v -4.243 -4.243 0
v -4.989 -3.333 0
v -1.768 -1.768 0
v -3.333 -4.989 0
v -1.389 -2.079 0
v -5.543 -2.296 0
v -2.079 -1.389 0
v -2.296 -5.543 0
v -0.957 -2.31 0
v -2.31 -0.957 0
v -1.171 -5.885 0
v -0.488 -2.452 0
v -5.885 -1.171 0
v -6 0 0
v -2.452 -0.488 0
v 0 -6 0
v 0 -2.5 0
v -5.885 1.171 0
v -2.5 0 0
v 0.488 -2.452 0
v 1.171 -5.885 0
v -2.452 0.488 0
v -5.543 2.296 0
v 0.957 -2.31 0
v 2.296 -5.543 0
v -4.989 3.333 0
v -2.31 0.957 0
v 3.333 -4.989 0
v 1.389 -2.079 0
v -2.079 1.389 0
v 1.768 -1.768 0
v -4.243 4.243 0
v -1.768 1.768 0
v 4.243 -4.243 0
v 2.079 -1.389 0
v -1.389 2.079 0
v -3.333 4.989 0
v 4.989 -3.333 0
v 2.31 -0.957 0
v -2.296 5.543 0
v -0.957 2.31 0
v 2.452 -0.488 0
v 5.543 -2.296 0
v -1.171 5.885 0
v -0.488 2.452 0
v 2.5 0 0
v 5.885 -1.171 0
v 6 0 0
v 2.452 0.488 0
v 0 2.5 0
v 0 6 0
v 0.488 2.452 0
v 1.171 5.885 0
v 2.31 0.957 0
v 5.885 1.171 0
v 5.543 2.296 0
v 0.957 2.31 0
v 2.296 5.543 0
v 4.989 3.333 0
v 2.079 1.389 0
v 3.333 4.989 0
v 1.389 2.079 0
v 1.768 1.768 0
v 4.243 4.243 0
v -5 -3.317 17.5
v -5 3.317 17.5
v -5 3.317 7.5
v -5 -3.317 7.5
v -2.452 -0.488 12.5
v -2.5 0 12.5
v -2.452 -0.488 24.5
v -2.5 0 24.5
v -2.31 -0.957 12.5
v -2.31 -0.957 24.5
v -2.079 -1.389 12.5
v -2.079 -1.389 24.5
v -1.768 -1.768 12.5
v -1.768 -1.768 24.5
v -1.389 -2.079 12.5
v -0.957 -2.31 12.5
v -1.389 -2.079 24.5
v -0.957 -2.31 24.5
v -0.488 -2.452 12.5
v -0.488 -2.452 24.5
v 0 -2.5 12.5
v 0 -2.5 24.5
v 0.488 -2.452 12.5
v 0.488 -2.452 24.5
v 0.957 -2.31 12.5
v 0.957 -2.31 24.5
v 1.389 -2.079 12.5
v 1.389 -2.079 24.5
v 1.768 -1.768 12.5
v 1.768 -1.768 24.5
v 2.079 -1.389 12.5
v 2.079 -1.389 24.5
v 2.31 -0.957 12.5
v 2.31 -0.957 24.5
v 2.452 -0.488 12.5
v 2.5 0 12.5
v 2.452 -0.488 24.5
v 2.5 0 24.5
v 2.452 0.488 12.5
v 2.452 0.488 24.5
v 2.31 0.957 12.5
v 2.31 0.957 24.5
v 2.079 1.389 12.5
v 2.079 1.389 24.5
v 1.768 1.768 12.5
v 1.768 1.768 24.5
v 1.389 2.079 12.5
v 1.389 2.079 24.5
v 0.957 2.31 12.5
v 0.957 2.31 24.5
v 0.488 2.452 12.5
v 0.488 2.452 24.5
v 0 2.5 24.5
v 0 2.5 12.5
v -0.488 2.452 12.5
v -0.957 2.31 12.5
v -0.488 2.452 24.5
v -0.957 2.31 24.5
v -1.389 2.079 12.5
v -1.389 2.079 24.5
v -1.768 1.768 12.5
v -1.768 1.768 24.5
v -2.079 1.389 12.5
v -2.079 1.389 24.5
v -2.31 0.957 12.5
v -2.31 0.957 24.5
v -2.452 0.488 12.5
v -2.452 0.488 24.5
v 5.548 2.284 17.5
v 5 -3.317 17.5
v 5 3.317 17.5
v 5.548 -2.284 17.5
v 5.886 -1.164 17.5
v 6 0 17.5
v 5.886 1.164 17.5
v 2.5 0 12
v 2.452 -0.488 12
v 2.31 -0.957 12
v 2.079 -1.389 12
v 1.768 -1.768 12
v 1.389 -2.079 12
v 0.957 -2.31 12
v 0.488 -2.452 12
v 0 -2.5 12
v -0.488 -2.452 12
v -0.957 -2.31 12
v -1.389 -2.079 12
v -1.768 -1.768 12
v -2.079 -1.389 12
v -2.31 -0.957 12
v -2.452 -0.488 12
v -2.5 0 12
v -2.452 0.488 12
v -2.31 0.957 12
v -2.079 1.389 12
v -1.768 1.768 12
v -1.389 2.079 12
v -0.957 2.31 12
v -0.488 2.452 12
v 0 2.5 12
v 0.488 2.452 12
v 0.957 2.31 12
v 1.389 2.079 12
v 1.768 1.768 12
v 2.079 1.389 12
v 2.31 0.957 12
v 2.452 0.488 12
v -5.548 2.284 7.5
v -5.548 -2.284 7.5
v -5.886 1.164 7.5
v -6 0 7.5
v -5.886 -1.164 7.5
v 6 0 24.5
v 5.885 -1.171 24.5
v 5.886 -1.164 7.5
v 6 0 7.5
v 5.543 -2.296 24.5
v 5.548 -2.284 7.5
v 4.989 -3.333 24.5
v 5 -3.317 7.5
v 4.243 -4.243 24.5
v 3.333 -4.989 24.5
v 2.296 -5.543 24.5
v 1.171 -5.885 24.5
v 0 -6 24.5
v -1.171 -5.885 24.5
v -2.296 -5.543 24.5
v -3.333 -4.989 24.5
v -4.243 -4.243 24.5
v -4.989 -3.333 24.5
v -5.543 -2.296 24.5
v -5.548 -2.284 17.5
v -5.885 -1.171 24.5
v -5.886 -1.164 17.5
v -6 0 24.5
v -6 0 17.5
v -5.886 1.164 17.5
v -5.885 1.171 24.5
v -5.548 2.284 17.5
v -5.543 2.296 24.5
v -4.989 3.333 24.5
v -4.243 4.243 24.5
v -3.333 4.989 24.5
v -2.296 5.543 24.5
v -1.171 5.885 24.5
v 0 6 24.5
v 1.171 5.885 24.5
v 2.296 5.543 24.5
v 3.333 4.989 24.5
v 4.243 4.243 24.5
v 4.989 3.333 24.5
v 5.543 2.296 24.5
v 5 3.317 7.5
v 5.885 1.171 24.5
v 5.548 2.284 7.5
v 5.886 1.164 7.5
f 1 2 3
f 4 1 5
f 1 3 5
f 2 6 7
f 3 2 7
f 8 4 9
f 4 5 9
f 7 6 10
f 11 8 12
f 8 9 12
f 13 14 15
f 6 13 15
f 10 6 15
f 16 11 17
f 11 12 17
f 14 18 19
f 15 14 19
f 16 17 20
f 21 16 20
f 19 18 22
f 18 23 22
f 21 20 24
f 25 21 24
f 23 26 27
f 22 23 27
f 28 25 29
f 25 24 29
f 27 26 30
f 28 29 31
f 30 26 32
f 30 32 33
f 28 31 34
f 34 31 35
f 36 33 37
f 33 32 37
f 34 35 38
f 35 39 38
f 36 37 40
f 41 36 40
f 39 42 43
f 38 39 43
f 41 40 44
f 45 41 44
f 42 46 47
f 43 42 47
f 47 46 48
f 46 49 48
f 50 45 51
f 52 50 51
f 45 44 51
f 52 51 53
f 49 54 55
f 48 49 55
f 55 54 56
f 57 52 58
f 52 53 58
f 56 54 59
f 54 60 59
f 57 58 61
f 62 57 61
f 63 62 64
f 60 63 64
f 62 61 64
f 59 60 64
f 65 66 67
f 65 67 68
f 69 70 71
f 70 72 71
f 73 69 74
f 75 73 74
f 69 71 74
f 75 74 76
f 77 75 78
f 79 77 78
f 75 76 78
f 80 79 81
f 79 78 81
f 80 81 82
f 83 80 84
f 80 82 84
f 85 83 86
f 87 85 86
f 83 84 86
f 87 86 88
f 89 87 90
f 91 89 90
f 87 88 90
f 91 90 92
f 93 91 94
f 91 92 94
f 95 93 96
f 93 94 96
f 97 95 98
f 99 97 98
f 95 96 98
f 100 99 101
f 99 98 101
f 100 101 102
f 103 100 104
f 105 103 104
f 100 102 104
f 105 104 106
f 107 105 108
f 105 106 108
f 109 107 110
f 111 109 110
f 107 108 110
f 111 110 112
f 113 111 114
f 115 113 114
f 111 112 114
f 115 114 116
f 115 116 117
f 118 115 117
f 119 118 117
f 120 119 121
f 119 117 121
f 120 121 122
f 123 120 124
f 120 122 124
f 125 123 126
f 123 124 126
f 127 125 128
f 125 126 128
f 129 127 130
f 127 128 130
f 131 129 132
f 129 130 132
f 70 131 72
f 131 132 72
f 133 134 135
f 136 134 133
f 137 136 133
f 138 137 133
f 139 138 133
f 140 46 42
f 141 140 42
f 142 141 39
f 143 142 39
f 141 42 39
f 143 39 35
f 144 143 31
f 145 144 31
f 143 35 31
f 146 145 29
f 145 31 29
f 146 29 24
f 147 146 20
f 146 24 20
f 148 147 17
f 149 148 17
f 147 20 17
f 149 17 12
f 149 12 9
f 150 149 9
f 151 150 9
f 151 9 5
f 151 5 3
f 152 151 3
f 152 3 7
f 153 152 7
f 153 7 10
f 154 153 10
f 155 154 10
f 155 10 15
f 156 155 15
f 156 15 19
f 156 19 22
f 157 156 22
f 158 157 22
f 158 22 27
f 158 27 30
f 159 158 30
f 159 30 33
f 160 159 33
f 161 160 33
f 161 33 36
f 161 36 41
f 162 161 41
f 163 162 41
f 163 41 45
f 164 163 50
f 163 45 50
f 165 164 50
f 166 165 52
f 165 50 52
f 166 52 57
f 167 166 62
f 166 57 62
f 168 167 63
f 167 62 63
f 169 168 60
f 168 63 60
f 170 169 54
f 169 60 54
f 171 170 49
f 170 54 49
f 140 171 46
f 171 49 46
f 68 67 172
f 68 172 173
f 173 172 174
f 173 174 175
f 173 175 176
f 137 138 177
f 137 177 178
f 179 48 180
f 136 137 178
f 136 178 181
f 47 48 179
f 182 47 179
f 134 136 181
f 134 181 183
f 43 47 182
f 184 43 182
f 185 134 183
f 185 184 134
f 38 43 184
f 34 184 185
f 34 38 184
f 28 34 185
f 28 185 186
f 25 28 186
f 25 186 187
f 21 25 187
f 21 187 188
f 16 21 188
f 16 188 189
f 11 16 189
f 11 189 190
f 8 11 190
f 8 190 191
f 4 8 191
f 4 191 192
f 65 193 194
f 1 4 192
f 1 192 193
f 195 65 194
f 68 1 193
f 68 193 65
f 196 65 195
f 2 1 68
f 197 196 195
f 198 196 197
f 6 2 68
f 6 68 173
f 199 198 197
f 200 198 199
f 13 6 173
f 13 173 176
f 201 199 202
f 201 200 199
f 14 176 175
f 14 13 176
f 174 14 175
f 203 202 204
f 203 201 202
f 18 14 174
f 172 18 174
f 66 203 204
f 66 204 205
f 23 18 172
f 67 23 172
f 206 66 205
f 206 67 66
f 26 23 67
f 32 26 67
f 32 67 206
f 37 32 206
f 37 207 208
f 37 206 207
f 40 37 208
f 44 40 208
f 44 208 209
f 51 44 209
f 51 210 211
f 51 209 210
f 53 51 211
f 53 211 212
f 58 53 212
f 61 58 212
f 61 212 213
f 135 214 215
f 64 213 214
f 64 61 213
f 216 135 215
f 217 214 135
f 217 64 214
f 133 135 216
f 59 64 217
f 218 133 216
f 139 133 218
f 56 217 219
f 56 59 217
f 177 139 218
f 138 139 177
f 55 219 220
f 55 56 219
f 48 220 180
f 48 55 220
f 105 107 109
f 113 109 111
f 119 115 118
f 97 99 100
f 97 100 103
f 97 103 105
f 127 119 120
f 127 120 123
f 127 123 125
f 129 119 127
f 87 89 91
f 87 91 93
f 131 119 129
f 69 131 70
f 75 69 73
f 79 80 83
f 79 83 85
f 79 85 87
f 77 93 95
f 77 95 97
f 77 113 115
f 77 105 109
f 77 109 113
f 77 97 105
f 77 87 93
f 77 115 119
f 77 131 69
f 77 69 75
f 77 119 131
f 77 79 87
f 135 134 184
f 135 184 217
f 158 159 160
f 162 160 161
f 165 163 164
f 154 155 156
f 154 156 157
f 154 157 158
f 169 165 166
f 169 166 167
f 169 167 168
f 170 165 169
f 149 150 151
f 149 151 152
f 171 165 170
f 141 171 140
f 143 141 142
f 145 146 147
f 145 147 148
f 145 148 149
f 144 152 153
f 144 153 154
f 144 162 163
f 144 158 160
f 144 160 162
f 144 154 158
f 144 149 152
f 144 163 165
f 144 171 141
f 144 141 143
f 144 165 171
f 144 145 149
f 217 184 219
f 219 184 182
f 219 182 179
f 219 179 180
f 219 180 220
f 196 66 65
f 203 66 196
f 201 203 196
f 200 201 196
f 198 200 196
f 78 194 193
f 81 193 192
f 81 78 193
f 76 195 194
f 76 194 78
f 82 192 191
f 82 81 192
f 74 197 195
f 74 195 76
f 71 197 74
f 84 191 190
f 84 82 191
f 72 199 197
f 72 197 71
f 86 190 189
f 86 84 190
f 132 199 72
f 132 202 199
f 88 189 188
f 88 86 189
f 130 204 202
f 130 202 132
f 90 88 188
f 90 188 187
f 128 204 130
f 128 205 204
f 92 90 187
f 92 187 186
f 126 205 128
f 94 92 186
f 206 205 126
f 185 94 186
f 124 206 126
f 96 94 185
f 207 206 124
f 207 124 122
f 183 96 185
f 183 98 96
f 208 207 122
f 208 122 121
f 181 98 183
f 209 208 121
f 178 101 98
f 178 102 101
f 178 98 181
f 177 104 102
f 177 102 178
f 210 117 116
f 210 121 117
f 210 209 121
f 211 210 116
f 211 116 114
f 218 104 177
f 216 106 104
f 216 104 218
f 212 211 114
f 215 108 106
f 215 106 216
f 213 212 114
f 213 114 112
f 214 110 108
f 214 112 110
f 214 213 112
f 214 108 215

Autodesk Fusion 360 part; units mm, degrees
sketch "Esquisse1" plane through (0, 0, 0) normal (0, 0, 1) x (1, 0, 0)
  circle A0 centre (0, 0) radius 6
  dimension "d1" = 12
extrude "Extrusion1" add sketch "Esquisse1" along normal blind 24.5
sketch "Esquisse2" plane through (0, 0, 24.5) normal (0, 0, 1) x (-1, 0, 0)
  circle A0 centre (0, 0) radius 6
  circle A1 centre (0, 0) radius 2.5
  dimension "d5" = 5
extrude "Extrusion2" cut sketch "Esquisse2" against normal blind 12 contours A1
sketch "Esquisse3" plane through (0, 0, 0) normal (0, 0, -1) x (1, 0, 0)
  circle A0 centre (0, 0) radius 6
  circle A1 centre (0, 0) radius 2.5
  dimension "d8" = 5
extrude "Extrusion3" cut sketch "Esquisse3" against normal blind 12 contours A1
sketch "Esquisse4" plane through (0, 0, 24.5) normal (0, 0, 1) x (-1, 0, 0)
  circle A0 centre (0, 0) radius 2.5
  circle A1 centre (0, 0) radius 6
  line L0 (5, 8) -> (-5, 8)
  line L1 (-5, 8) -> (-5, -7.4606)
  line L2 (-5, -7.4606) -> (5, -7.4606)
  line L3 (5, -7.4606) -> (5, 8)
  dimension "d11" = 5
  dimension "d12" = 10
extrude "Extrusion4" cut sketch "Esquisse4" against normal blind 10 from surface at -7 contours A1 L3 | A1 L1
